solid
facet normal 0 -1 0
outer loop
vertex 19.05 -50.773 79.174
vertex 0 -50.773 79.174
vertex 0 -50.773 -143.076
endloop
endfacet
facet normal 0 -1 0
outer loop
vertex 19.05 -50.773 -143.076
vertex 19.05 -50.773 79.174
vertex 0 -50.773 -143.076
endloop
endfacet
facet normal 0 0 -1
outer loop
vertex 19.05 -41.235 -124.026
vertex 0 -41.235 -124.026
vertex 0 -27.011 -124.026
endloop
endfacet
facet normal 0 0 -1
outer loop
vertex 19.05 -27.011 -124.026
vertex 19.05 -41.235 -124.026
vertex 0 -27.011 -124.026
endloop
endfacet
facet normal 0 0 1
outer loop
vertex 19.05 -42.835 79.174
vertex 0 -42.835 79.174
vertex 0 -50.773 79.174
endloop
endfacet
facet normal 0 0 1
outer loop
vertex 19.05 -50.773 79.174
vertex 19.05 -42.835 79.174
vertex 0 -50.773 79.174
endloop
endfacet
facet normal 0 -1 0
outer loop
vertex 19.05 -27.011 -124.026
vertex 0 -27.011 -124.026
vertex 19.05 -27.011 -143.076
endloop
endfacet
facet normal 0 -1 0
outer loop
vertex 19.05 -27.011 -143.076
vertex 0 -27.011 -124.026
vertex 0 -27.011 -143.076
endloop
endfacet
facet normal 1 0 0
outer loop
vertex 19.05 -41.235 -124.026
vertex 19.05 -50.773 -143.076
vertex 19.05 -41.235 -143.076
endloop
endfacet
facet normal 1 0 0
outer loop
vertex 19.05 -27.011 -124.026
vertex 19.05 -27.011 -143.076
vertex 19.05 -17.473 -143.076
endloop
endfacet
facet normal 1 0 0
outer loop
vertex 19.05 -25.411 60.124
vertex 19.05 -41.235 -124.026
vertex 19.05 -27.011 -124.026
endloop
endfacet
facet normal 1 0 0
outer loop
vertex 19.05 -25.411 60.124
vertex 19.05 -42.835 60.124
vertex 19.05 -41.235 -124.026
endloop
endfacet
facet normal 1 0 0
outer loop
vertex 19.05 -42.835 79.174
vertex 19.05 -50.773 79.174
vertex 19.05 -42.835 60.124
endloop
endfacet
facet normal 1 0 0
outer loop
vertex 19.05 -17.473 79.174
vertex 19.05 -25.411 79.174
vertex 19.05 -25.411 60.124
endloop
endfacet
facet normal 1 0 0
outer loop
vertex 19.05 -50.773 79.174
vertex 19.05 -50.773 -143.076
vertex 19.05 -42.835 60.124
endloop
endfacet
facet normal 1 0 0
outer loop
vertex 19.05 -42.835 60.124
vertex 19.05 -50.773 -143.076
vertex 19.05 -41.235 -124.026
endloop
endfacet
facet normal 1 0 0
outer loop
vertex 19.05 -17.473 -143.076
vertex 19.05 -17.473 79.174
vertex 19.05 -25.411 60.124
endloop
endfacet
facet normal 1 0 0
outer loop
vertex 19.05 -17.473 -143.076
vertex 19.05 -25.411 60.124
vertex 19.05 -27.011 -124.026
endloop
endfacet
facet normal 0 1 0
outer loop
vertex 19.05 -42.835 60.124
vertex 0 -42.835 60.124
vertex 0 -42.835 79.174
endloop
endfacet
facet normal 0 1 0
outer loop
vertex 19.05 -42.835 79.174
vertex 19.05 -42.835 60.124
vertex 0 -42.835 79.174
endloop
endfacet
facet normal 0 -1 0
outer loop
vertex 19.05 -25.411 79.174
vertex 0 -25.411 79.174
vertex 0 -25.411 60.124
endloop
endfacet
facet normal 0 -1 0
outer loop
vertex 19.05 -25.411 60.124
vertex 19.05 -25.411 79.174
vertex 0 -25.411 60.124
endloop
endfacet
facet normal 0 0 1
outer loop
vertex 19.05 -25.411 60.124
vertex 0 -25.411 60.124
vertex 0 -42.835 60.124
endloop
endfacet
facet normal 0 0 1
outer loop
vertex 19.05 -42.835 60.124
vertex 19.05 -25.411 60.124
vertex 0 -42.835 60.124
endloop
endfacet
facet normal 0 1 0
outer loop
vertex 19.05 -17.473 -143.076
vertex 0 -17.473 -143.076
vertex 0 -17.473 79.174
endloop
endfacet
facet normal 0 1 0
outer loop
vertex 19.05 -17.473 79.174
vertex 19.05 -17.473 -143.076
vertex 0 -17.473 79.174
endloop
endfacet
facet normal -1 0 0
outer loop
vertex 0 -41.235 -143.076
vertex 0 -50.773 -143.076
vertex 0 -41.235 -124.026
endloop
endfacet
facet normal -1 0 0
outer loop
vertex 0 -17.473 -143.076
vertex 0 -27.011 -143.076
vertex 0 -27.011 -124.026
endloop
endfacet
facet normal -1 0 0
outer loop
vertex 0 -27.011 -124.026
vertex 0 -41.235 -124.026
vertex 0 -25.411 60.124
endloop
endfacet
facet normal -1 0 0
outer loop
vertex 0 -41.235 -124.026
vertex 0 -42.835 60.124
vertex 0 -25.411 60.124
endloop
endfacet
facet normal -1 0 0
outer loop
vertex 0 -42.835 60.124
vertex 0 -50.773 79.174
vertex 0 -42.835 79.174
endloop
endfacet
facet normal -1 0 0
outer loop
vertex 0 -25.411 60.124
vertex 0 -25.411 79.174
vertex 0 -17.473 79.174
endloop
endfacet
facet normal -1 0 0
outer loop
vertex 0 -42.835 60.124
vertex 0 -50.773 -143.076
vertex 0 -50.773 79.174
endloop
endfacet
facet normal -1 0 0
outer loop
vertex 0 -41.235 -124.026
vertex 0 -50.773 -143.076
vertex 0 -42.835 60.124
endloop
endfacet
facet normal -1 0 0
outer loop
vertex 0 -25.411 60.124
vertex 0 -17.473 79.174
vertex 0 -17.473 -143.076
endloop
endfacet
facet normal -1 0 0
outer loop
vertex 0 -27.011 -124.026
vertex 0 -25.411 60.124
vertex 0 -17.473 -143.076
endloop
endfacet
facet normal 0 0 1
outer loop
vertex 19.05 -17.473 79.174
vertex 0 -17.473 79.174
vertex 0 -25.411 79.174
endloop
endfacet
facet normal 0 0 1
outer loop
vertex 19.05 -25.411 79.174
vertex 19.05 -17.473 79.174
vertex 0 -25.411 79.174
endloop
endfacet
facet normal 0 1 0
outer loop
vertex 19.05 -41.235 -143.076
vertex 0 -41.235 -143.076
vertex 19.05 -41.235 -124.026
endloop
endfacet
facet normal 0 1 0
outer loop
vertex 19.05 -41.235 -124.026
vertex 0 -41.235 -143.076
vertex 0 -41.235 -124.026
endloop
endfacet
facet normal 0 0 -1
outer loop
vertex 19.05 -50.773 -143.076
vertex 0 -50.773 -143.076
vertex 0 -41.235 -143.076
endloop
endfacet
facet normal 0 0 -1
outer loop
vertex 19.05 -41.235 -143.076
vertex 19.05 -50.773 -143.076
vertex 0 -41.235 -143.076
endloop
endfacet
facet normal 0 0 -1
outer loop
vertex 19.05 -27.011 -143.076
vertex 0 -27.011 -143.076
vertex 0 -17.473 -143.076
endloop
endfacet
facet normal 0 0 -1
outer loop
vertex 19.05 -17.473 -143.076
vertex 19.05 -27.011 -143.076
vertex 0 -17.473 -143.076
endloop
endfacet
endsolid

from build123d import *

# Parameters (mm, degrees)
F1_DEPTH = 19.05
F2_DEPTH = 9.525


with BuildPart() as f1:
    # F0 (on Right) → F1 (new body)
    with BuildSketch(Plane.YZ):
        Polygon((-42.835101, 79.173712), (-50.772601, 79.173712), (-50.772601, -143.076288), (-41.234901, -143.076288), (-41.234901, -124.026288), (-34.122901, -124.026288), (-27.010901, -124.026288), (-27.010901, -143.076288), (-17.473201, -143.076288), (-17.473201, 79.173712), (-25.410701, 79.173712), (-25.410701, 60.123712), (-34.122901, 60.123712), (-42.835101, 60.123712), align=None)
    extrude(amount=F1_DEPTH)

    # F0 (on Right) → F2 (join)
    with BuildSketch(Plane.YZ):
        Polygon((-42.835101, 79.173712), (-50.772601, 79.173712), (-50.772601, -143.076288), (-41.234901, -143.076288), (-41.234901, -124.026288), (-34.122901, -124.026288), (-27.010901, -124.026288), (-27.010901, -143.076288), (-17.473201, -143.076288), (-17.473201, 79.173712), (-25.410701, 79.173712), (-25.410701, 60.123712), (-34.122901, 60.123712), (-42.835101, 60.123712), align=None)
    extrude(amount=F2_DEPTH)


solid = f1.part
